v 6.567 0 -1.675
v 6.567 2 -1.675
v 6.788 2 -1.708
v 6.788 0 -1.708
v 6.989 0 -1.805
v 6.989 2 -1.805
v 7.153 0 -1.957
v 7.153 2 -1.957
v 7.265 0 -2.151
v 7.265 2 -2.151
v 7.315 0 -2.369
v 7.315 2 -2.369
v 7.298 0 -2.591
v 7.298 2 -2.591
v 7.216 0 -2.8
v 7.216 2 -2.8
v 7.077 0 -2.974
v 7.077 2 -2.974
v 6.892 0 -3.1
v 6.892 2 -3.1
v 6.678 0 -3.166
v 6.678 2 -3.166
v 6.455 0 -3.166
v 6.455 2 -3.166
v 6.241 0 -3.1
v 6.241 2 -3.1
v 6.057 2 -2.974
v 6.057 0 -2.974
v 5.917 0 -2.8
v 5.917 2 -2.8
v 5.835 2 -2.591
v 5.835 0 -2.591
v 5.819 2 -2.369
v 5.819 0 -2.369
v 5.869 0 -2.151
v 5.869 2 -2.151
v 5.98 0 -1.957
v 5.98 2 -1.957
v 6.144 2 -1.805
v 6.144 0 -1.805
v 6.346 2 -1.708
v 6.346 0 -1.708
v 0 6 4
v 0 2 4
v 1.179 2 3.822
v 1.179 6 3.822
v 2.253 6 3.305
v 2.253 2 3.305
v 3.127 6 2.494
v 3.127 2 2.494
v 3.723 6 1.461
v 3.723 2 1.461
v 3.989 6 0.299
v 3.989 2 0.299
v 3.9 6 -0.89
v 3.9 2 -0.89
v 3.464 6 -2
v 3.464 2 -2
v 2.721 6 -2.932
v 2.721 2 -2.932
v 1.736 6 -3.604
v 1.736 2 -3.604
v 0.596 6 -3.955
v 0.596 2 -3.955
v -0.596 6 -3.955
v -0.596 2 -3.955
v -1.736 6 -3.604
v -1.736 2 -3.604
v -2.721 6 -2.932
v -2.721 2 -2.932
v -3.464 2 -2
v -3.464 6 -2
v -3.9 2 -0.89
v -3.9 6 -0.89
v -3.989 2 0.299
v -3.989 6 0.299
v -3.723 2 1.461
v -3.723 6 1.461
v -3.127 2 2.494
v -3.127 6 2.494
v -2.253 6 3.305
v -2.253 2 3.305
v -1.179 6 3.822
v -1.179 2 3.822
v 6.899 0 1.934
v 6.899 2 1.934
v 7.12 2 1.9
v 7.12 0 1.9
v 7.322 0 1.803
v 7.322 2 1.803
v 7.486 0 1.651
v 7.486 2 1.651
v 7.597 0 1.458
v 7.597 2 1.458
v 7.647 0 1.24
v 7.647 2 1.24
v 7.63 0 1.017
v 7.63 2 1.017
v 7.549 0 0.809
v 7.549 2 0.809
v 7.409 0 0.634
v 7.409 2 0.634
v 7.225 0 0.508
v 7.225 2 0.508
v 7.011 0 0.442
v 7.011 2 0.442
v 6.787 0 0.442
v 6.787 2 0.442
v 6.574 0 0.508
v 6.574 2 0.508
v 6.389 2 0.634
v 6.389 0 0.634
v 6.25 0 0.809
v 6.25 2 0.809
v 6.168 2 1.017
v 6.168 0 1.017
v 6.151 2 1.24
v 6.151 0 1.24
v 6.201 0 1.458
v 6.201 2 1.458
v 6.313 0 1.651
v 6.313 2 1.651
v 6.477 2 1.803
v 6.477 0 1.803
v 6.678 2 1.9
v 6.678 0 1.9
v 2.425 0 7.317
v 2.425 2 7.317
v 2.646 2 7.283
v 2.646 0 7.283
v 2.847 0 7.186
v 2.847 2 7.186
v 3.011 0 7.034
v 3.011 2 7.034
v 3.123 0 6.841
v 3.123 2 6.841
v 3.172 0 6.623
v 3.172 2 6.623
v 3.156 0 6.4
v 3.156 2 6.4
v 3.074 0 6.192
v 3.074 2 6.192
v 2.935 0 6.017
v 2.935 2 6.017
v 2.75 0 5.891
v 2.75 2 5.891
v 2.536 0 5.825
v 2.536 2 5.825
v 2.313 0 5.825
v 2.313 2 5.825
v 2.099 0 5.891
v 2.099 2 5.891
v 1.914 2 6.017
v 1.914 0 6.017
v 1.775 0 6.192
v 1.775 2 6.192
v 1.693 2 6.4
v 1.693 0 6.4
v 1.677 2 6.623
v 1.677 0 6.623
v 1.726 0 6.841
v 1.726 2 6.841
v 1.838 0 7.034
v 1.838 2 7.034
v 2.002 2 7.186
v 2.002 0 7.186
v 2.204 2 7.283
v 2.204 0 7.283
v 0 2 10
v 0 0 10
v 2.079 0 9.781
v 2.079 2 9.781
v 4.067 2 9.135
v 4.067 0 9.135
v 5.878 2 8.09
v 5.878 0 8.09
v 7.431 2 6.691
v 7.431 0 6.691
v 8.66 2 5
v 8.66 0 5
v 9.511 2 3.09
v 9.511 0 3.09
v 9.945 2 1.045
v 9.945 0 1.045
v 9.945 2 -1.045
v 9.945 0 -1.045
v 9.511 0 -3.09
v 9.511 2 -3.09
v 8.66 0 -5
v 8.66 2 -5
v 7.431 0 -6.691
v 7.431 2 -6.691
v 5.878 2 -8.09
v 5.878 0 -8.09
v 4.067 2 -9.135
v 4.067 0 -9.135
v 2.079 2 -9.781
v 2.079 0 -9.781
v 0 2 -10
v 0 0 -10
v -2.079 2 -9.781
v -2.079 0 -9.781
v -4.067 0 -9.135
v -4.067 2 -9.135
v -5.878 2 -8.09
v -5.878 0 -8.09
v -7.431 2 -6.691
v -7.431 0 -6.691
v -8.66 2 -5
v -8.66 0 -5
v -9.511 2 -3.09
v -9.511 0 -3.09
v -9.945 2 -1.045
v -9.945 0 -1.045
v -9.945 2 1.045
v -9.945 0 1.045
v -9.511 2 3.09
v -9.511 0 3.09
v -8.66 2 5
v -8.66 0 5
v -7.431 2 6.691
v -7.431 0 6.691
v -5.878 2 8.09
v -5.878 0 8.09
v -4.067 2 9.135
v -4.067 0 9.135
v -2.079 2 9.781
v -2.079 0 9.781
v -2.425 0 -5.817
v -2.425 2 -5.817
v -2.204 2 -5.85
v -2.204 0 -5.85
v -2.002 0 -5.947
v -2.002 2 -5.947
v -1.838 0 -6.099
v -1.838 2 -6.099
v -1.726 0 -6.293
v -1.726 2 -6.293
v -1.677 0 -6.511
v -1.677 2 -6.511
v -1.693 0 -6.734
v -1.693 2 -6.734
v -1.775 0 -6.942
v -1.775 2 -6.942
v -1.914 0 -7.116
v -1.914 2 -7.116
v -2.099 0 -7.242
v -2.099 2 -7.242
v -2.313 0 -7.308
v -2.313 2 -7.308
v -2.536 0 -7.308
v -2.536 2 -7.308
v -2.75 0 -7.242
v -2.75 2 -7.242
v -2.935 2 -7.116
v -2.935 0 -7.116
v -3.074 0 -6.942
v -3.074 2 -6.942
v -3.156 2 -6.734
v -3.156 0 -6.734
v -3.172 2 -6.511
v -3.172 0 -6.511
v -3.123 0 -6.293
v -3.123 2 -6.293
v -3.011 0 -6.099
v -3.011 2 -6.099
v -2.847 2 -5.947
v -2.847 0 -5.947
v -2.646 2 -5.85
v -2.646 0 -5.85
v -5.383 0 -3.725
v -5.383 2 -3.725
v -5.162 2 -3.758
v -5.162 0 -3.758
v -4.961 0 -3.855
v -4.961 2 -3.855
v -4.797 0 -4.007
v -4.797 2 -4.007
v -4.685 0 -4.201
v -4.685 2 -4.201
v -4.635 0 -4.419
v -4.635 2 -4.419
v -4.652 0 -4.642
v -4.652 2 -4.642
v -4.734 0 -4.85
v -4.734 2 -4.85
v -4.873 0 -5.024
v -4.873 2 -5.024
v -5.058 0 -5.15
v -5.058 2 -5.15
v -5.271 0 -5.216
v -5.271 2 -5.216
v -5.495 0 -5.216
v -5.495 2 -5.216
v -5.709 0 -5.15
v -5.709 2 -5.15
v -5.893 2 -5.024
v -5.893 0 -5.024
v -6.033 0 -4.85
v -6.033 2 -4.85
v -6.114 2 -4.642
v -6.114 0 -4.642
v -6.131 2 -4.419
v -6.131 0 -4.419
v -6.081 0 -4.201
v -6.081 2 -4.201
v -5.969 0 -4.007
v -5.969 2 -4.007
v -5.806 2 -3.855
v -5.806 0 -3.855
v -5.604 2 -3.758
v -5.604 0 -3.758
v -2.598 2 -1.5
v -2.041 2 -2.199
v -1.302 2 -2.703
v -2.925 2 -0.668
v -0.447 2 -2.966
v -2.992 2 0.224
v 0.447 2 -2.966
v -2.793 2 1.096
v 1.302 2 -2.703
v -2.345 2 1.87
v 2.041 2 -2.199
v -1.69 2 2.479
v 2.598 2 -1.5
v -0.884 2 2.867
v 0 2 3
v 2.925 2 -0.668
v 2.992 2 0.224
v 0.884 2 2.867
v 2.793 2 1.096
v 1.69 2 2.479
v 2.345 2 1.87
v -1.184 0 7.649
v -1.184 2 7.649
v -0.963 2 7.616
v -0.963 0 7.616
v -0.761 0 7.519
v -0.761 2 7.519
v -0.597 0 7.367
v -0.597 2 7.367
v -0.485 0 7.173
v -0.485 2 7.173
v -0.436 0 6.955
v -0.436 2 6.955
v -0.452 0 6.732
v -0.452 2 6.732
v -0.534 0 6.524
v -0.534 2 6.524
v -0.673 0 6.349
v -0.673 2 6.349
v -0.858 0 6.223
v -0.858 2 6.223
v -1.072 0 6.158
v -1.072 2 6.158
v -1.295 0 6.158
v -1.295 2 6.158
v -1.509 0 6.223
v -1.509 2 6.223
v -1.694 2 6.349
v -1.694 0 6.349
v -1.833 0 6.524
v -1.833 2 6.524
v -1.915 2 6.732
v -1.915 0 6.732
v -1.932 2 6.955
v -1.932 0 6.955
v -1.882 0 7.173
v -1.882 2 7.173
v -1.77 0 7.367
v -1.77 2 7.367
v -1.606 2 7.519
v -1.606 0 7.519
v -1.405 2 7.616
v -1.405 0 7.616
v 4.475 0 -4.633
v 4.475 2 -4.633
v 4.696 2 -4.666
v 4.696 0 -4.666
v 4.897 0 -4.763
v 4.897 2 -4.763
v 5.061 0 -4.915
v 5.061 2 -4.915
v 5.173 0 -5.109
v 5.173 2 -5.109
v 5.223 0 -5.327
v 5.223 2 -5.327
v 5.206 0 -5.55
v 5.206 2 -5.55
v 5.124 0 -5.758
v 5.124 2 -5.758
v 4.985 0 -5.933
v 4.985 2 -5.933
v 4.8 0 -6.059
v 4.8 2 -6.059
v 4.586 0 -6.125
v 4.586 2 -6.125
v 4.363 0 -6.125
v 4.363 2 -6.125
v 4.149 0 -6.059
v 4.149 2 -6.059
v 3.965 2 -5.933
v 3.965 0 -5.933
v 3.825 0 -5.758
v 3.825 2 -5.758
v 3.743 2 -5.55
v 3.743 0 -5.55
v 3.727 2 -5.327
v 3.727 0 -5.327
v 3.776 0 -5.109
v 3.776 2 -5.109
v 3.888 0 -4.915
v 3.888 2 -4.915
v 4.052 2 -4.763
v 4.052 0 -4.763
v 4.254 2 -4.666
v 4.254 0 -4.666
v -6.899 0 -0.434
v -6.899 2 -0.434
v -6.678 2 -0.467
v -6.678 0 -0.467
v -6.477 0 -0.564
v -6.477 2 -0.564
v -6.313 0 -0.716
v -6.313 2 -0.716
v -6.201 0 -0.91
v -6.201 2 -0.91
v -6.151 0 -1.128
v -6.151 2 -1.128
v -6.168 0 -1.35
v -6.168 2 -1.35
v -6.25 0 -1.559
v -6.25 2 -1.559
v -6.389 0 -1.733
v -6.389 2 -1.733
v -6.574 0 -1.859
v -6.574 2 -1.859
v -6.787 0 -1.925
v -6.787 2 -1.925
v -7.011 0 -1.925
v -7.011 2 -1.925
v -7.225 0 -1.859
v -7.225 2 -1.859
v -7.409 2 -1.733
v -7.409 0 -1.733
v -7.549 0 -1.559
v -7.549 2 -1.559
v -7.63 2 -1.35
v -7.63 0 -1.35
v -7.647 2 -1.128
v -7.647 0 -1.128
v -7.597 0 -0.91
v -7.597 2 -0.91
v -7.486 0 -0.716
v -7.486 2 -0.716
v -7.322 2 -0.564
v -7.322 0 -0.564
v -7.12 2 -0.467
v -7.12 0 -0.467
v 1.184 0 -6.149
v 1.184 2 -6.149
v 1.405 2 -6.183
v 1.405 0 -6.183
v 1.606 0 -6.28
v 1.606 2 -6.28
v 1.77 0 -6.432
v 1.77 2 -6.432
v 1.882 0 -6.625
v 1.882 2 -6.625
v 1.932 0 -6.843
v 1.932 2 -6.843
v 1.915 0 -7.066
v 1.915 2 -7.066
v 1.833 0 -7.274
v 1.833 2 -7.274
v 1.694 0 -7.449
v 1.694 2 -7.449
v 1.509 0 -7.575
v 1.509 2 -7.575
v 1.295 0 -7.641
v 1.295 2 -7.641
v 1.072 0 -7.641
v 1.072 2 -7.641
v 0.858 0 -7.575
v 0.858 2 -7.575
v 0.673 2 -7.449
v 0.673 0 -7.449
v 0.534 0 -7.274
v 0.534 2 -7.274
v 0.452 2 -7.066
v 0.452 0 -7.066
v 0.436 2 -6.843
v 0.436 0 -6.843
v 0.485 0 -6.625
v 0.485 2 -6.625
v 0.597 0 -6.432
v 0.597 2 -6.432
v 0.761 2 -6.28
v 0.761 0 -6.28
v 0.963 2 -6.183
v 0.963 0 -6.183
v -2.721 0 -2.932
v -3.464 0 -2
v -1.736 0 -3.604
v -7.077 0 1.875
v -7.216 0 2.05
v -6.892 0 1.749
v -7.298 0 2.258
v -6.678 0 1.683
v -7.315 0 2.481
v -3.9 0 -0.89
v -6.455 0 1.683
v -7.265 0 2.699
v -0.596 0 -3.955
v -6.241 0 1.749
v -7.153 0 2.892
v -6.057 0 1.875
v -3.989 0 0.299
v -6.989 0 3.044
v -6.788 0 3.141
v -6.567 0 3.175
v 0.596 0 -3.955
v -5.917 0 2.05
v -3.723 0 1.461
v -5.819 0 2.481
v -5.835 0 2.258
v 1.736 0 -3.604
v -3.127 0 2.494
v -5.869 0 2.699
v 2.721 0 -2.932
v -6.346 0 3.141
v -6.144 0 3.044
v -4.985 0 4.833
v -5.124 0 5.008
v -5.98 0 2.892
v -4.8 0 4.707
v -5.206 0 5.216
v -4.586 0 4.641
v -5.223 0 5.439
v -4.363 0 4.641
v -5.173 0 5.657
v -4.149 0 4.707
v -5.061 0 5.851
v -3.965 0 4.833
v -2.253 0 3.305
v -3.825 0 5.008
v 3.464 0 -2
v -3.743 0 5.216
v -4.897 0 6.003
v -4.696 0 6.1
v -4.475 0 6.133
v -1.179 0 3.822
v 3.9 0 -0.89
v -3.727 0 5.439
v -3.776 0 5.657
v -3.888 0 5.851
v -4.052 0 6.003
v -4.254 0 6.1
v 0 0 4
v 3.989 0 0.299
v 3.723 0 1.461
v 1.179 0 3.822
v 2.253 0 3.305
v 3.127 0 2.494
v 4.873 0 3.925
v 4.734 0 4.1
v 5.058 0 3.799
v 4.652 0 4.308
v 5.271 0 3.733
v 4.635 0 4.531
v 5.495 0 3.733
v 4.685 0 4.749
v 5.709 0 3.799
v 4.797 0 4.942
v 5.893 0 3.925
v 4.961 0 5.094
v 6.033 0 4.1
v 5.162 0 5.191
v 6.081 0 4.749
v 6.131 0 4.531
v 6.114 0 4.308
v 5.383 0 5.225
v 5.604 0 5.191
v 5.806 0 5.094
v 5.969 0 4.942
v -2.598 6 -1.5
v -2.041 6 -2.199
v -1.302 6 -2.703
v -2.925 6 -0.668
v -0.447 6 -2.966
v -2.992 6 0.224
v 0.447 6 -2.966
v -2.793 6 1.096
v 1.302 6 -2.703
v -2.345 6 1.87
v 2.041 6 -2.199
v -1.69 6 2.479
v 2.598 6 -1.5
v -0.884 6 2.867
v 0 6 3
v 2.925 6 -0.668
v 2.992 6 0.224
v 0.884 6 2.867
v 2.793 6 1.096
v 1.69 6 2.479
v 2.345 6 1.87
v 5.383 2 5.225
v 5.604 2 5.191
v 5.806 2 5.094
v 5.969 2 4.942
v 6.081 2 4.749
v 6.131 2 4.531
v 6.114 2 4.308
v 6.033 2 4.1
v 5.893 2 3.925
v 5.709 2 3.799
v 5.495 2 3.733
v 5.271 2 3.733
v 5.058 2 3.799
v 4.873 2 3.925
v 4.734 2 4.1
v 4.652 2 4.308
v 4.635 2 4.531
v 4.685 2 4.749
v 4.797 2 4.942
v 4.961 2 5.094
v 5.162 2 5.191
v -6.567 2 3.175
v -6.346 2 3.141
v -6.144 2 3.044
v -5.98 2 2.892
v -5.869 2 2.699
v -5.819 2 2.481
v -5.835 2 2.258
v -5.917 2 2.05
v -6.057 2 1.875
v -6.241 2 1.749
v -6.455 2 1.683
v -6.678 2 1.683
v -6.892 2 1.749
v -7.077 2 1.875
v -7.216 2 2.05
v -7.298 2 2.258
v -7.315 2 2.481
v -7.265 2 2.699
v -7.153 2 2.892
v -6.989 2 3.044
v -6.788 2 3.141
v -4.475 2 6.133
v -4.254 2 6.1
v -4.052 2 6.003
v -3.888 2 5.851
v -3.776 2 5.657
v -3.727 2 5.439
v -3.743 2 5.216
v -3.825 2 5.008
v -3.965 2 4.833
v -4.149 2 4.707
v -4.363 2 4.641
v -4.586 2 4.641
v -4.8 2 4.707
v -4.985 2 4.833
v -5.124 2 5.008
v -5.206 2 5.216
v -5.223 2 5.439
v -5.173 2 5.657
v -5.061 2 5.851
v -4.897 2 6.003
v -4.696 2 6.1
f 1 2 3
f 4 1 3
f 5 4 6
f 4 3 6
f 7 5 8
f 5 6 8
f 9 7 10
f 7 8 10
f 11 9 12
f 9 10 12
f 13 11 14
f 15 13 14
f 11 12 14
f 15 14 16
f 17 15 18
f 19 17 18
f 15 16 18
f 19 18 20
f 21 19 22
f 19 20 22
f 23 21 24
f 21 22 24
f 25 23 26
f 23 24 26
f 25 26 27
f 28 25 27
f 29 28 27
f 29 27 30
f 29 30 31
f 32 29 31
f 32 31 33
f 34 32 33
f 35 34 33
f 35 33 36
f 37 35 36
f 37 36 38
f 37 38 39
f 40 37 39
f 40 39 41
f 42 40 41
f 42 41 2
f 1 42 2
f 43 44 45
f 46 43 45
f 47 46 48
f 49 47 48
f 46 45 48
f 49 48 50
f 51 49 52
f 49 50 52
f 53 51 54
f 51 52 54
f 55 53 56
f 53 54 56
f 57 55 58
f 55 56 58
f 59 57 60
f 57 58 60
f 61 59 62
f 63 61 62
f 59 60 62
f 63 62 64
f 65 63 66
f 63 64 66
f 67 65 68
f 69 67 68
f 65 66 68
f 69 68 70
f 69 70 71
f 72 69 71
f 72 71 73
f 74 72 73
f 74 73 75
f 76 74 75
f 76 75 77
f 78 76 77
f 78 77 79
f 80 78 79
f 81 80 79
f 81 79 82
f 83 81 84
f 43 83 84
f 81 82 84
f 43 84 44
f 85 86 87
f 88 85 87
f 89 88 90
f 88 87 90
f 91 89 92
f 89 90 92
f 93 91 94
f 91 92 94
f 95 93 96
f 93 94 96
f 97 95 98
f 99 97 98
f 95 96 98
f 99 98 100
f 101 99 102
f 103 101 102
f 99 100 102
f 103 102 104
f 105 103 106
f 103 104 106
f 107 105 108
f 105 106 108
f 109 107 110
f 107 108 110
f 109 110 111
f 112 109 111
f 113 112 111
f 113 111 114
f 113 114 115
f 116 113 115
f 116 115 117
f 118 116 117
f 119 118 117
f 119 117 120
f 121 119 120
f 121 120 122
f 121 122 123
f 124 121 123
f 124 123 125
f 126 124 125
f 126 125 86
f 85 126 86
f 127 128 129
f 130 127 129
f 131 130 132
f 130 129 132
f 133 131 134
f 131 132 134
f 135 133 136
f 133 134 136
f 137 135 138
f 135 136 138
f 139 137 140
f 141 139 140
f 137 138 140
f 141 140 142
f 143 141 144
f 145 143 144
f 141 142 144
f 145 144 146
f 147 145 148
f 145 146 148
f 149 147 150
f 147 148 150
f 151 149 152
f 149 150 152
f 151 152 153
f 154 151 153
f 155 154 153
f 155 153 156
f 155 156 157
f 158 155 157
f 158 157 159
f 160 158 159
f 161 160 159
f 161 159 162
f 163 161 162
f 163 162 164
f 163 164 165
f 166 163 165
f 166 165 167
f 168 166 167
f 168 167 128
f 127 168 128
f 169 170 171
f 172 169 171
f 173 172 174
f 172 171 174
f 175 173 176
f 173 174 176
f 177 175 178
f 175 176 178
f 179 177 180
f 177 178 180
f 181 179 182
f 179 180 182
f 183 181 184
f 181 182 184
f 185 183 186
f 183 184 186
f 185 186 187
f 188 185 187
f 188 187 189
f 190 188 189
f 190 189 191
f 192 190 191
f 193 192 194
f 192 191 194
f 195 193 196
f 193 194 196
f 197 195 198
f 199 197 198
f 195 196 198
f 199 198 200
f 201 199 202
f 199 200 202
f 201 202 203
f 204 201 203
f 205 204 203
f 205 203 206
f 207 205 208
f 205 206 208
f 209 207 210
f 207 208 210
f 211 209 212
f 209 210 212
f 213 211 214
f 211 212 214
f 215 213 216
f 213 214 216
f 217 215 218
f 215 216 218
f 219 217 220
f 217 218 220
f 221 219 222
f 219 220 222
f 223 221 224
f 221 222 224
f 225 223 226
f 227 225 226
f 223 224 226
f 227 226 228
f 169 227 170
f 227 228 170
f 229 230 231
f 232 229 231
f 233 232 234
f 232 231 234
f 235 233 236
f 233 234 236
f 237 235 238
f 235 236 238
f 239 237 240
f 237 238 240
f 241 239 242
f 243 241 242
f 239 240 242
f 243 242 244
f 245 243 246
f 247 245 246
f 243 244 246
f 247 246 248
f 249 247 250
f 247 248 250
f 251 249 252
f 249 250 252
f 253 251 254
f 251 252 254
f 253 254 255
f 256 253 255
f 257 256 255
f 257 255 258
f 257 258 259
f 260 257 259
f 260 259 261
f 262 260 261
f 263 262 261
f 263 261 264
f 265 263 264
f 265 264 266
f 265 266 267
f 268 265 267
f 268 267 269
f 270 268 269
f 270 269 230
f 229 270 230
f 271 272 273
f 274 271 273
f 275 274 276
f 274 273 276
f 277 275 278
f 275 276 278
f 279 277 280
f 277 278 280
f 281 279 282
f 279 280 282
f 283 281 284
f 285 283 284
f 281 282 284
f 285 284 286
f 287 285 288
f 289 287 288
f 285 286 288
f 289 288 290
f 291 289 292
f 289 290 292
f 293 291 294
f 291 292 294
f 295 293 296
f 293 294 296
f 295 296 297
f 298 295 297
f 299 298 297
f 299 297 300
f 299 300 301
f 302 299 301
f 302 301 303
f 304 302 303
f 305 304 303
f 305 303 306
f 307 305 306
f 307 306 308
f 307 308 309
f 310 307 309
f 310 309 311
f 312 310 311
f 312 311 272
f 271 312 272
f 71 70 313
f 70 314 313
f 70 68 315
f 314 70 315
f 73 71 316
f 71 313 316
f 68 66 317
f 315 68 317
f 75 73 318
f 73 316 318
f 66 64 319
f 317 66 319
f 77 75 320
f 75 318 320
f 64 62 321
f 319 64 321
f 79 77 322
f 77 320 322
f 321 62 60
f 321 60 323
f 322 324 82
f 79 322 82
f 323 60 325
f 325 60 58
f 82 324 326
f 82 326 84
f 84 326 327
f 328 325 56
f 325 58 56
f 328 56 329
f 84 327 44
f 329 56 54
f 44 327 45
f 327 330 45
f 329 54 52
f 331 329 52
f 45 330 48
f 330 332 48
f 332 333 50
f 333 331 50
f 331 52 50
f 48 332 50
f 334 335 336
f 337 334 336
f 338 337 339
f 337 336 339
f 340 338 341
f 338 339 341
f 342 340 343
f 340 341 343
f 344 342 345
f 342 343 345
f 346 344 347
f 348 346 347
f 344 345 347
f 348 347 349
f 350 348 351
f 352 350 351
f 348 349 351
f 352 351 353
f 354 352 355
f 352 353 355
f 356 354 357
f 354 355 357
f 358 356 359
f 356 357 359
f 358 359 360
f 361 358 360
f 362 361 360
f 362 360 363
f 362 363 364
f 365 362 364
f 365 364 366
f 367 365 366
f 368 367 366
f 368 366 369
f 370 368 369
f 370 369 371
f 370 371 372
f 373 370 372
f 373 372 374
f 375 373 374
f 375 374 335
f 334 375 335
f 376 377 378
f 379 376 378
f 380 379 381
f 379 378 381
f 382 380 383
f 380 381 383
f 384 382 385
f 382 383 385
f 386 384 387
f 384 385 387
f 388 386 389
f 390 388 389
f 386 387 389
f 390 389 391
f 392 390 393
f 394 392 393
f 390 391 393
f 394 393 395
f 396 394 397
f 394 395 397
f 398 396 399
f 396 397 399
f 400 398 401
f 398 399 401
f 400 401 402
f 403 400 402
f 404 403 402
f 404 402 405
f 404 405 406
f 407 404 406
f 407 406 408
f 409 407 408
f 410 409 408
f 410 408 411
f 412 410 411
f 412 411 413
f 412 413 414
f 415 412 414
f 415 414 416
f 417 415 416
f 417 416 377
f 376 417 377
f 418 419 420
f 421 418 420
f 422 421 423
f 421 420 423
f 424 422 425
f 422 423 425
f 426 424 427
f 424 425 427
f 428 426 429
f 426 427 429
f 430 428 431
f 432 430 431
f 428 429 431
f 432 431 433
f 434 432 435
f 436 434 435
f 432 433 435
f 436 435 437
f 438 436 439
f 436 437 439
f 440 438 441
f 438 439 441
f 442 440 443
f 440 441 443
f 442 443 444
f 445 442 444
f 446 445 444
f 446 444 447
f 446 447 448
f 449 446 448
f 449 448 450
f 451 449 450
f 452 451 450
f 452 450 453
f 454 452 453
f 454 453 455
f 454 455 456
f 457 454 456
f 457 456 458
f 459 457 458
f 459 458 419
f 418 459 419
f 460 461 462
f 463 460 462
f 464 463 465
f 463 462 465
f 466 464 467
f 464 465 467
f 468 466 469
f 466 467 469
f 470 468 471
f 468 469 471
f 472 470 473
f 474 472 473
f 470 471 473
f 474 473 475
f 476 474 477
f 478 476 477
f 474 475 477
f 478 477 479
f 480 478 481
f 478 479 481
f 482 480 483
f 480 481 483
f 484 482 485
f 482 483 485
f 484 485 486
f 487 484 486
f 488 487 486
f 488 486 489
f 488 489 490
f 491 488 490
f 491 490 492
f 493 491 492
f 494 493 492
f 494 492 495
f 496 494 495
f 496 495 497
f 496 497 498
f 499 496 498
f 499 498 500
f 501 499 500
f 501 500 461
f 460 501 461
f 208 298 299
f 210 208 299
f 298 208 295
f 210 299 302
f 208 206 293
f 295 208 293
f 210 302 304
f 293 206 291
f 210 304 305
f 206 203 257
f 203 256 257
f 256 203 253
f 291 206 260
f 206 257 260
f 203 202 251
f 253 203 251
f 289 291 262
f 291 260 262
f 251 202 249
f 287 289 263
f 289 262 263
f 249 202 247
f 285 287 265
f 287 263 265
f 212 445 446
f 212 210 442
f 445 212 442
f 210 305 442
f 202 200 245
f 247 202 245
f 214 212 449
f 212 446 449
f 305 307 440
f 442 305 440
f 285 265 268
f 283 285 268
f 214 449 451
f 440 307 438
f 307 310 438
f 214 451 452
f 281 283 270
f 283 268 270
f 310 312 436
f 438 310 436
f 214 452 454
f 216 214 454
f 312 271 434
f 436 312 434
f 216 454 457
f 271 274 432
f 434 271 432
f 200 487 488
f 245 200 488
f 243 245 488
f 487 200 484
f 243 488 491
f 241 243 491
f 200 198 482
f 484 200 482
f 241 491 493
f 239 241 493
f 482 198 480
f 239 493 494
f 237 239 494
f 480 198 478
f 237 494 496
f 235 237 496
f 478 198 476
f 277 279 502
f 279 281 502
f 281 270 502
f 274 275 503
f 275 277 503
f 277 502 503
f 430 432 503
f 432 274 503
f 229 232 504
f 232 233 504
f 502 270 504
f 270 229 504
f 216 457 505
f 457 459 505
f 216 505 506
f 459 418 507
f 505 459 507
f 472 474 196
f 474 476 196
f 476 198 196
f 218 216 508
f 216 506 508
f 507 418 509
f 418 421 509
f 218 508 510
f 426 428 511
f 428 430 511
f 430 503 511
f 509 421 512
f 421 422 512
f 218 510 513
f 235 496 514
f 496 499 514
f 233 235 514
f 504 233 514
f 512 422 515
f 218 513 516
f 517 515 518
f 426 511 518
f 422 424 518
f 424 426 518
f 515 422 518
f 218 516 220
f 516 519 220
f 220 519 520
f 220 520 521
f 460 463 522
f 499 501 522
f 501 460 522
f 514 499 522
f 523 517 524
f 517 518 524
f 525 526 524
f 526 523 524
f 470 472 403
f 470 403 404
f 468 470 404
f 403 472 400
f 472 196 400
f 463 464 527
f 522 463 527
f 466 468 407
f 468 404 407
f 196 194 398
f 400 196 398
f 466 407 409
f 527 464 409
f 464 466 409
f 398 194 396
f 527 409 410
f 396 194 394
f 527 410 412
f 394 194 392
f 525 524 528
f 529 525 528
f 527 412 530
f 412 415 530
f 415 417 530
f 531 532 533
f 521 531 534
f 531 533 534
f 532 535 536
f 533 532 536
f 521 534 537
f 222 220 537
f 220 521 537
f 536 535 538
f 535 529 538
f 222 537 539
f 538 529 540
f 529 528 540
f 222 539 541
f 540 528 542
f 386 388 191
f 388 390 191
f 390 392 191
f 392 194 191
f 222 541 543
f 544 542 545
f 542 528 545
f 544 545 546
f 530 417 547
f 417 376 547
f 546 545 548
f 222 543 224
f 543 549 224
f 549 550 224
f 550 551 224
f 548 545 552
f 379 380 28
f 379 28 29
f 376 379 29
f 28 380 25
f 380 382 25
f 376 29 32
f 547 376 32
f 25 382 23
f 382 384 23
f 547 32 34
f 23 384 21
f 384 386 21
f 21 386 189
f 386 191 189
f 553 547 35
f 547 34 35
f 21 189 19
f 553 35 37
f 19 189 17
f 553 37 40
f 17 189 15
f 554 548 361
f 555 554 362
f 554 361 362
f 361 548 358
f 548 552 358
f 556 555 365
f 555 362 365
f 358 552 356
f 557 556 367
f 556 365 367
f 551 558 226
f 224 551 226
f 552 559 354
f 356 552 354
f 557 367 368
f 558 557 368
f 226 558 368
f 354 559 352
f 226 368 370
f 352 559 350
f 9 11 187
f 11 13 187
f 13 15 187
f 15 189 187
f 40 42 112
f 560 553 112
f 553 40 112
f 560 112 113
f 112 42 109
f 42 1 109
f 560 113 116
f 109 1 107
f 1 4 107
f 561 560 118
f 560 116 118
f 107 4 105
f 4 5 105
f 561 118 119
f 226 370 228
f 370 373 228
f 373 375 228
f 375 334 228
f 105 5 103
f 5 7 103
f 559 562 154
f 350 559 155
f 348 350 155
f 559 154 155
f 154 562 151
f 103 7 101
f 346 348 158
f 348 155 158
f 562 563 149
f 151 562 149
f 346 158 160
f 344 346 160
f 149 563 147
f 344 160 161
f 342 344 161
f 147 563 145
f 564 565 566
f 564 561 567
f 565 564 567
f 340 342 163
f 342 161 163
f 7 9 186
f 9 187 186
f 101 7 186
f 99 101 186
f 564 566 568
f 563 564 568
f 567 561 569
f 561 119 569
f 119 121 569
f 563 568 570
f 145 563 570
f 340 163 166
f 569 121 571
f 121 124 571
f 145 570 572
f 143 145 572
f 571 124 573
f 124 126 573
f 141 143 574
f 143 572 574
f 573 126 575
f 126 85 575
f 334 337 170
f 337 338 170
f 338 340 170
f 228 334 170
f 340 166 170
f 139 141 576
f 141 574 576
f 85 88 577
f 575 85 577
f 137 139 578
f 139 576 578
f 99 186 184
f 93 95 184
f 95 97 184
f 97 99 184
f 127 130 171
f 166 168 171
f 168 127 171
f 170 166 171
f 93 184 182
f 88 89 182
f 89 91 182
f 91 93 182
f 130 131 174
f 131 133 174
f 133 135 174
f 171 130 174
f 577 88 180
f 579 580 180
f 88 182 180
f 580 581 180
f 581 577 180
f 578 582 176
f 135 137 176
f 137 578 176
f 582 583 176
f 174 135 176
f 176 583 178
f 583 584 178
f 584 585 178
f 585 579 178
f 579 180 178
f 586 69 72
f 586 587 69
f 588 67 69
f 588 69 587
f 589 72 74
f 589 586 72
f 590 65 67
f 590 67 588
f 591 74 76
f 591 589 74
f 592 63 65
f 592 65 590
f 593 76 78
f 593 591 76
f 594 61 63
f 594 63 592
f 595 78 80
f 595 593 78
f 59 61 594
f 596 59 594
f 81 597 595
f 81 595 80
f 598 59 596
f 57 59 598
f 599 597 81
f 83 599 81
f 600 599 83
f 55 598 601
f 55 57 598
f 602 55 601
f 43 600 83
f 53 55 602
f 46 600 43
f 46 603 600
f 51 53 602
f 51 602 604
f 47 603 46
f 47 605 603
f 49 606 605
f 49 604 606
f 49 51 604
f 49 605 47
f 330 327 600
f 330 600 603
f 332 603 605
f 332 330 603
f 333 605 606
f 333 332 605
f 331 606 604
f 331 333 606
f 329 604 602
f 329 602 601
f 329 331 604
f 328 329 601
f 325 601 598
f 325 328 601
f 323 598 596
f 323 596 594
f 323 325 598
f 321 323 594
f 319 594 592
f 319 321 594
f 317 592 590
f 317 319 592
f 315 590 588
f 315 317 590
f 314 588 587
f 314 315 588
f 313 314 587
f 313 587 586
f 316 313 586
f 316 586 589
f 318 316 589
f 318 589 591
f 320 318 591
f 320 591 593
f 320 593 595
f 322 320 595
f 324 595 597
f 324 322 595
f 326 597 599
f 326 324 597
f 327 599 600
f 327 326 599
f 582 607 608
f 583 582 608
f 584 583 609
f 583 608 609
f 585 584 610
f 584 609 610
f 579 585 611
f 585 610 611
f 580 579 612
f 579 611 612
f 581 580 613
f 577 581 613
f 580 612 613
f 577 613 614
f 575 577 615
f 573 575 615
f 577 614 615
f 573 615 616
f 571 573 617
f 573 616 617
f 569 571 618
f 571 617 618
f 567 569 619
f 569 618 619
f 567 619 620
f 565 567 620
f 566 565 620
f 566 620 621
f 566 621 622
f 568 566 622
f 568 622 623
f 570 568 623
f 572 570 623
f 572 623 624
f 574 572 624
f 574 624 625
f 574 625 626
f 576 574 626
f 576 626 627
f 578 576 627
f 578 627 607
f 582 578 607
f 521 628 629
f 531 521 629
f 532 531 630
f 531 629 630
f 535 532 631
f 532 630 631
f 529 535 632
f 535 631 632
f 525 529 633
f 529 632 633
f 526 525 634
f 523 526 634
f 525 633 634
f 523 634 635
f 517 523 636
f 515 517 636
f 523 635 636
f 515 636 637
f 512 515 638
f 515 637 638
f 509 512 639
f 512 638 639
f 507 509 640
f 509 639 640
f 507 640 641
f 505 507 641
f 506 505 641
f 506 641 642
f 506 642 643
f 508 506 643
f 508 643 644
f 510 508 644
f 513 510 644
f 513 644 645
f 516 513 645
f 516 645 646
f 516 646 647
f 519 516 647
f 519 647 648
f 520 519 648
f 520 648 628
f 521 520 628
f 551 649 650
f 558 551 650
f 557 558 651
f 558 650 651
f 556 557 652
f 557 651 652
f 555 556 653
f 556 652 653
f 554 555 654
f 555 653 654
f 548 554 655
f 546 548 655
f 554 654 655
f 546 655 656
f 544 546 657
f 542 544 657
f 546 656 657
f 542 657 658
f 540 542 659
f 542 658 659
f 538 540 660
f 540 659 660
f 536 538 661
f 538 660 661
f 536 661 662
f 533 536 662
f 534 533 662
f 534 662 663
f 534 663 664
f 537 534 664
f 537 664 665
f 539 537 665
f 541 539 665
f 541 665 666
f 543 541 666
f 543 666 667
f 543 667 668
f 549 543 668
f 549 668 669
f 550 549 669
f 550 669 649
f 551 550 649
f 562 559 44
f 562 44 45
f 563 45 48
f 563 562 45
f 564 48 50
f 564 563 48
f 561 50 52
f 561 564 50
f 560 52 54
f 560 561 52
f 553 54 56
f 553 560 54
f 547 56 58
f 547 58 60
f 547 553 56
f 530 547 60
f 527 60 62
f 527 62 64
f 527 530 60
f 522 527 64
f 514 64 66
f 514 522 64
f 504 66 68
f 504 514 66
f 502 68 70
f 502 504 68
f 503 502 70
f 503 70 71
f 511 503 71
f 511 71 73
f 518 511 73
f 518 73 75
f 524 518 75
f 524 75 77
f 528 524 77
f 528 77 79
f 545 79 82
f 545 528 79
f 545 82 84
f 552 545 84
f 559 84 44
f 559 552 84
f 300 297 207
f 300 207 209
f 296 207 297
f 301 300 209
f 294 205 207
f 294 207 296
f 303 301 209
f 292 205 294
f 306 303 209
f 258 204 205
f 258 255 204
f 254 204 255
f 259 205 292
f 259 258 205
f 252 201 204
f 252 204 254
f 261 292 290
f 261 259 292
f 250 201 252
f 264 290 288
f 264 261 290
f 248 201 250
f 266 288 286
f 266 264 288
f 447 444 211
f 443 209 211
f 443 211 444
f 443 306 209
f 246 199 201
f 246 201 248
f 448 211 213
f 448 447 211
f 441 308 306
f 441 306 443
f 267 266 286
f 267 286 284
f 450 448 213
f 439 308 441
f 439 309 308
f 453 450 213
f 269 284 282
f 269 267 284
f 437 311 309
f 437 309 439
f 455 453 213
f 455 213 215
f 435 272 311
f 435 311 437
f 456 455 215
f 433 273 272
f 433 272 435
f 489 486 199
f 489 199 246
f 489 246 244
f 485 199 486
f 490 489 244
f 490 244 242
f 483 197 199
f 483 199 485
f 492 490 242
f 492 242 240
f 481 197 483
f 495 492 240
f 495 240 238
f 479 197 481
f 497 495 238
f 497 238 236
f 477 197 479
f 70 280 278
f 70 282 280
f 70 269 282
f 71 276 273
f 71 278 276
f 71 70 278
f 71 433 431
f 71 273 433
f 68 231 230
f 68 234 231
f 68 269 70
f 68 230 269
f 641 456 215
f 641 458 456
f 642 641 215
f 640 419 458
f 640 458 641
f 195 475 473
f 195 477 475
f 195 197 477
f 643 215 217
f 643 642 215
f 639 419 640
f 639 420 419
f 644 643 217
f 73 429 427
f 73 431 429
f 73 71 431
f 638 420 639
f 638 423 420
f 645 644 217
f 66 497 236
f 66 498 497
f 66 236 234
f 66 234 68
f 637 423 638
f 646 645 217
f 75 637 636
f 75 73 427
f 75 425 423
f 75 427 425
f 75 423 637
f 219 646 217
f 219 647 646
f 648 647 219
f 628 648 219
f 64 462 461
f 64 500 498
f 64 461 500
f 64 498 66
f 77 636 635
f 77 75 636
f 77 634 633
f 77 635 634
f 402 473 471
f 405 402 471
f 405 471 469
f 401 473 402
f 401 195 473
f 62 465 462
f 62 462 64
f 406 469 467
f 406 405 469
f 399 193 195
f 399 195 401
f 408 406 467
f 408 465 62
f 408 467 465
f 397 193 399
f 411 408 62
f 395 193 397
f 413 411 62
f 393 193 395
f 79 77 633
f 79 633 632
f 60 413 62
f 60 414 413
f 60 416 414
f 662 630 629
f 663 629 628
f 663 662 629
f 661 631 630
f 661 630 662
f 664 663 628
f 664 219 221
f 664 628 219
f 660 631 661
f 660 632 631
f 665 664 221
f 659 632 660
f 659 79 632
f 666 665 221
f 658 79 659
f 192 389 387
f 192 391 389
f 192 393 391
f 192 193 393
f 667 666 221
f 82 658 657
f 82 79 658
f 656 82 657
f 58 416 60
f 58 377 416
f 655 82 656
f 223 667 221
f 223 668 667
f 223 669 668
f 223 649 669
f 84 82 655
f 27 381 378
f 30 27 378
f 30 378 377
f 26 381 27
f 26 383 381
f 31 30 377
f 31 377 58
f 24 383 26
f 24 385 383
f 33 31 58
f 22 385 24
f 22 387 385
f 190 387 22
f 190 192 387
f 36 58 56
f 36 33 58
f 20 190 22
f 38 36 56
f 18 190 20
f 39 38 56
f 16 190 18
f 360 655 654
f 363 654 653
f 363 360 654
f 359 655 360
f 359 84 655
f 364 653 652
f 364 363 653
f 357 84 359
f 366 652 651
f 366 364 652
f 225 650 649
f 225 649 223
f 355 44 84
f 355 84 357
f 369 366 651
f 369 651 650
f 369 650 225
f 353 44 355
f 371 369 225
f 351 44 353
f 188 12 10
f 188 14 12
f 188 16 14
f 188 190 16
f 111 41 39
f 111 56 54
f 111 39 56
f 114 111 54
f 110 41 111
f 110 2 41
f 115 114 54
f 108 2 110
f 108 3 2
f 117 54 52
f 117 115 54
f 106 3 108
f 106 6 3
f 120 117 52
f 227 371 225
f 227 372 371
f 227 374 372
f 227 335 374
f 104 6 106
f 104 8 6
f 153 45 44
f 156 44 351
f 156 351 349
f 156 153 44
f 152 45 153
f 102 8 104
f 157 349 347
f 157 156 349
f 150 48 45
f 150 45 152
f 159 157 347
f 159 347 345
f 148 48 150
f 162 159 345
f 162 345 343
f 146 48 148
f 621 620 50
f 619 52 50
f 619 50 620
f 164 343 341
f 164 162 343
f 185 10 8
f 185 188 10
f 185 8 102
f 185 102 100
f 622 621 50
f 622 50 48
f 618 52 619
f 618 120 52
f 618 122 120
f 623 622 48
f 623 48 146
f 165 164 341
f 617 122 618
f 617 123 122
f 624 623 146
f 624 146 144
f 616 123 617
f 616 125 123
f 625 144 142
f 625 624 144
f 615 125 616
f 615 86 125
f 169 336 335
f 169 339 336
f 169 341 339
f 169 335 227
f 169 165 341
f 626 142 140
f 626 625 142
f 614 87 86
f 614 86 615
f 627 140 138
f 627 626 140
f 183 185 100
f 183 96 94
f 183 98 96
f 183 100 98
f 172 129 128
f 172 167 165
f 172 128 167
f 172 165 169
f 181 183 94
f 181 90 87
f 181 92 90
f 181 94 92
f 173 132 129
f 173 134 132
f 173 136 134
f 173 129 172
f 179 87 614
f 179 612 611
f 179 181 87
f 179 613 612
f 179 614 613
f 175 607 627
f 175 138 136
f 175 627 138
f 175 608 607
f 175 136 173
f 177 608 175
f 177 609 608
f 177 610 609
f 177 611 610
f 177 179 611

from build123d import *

# Parameters (mm, degrees)
SKETCH1_R           = 10
SKETCH1_R_2         = 4
BOSS_EXTRUDE1_DEPTH = 2
SKETCH2_R           = 4
SKETCH2_R_2         = 3
BOSS_EXTRUDE2_DEPTH = 4
SKETCH3_R           = 0.75
CUT_EXTRUDE1_DEPTH  = 15.696938457


with BuildPart() as part:
    # Sketch1 → Boss-Extrude1 (new body)
    with BuildSketch(Plane(origin=(0, 0, 0), x_dir=(1, 0, 0), z_dir=(0, 1, 0))):
        with Locations(Location((0, 0, 0), (0, 0, 270))):
            Circle(SKETCH1_R)
        with Locations(Location((0, 0, 0), (0, 0, 270))):
            Circle(SKETCH1_R_2, mode=Mode.SUBTRACT)
    extrude(amount=BOSS_EXTRUDE1_DEPTH)

    # Sketch3 → Cut-Extrude1 (cut, through all)
    with BuildSketch(Plane(origin=(0, 2, 0), x_dir=(1, 0, 0), z_dir=(0, 1, 0))):
        with Locations(Location((-5.383090008, 4.474633166, 0), (0, 0, 270))):
            Circle(SKETCH3_R)
        with Locations(Location((-2.424576114, 6.566690998, 0), (0, 0, 270))):
            Circle(SKETCH3_R)
        with Locations(Location((1.183600991, 6.89920928, 0), (0, 0, 270))):
            Circle(SKETCH3_R)
        with Locations(Location((4.474633166, 5.383090008, 0), (0, 0, 270))):
            Circle(SKETCH3_R)
        with Locations(Location((6.566690998, 2.424576114, 0), (0, 0, 270))):
            Circle(SKETCH3_R)
        with Locations(Location((6.89920928, -1.183600991, 0), (0, 0, 270))):
            Circle(SKETCH3_R)
        with Locations(Location((5.383090008, -4.474633166, 0), (0, 0, 270))):
            Circle(SKETCH3_R)
        with Locations(Location((2.424576114, -6.566690998, 0), (0, 0, 270))):
            Circle(SKETCH3_R)
        with Locations(Location((-1.183600991, -6.89920928, 0), (0, 0, 270))):
            Circle(SKETCH3_R)
        with Locations(Location((-4.474633166, -5.383090008, 0), (0, 0, 270))):
            Circle(SKETCH3_R)
        with Locations(Location((-6.566690998, -2.424576114, 0), (0, 0, 270))):
            Circle(SKETCH3_R)
        with Locations(Location((-6.89920928, 1.183600991, 0), (0, 0, 270))):
            Circle(SKETCH3_R)
    extrude(amount=-CUT_EXTRUDE1_DEPTH, mode=Mode.SUBTRACT)


with BuildPart() as body_2:
    # Sketch2 → Boss-Extrude2 (new body)
    with BuildSketch(Plane(origin=(0, 2, 0), x_dir=(1, 0, 0), z_dir=(0, 1, 0))):
        with Locations(Location((0, 0, 0), (0, 0, 270))):
            Circle(SKETCH2_R)
        with Locations(Location((0, 0, 0), (0, 0, 270))):
            Circle(SKETCH2_R_2, mode=Mode.SUBTRACT)
    extrude(amount=BOSS_EXTRUDE2_DEPTH)


solid = Compound([part.part, body_2.part])
